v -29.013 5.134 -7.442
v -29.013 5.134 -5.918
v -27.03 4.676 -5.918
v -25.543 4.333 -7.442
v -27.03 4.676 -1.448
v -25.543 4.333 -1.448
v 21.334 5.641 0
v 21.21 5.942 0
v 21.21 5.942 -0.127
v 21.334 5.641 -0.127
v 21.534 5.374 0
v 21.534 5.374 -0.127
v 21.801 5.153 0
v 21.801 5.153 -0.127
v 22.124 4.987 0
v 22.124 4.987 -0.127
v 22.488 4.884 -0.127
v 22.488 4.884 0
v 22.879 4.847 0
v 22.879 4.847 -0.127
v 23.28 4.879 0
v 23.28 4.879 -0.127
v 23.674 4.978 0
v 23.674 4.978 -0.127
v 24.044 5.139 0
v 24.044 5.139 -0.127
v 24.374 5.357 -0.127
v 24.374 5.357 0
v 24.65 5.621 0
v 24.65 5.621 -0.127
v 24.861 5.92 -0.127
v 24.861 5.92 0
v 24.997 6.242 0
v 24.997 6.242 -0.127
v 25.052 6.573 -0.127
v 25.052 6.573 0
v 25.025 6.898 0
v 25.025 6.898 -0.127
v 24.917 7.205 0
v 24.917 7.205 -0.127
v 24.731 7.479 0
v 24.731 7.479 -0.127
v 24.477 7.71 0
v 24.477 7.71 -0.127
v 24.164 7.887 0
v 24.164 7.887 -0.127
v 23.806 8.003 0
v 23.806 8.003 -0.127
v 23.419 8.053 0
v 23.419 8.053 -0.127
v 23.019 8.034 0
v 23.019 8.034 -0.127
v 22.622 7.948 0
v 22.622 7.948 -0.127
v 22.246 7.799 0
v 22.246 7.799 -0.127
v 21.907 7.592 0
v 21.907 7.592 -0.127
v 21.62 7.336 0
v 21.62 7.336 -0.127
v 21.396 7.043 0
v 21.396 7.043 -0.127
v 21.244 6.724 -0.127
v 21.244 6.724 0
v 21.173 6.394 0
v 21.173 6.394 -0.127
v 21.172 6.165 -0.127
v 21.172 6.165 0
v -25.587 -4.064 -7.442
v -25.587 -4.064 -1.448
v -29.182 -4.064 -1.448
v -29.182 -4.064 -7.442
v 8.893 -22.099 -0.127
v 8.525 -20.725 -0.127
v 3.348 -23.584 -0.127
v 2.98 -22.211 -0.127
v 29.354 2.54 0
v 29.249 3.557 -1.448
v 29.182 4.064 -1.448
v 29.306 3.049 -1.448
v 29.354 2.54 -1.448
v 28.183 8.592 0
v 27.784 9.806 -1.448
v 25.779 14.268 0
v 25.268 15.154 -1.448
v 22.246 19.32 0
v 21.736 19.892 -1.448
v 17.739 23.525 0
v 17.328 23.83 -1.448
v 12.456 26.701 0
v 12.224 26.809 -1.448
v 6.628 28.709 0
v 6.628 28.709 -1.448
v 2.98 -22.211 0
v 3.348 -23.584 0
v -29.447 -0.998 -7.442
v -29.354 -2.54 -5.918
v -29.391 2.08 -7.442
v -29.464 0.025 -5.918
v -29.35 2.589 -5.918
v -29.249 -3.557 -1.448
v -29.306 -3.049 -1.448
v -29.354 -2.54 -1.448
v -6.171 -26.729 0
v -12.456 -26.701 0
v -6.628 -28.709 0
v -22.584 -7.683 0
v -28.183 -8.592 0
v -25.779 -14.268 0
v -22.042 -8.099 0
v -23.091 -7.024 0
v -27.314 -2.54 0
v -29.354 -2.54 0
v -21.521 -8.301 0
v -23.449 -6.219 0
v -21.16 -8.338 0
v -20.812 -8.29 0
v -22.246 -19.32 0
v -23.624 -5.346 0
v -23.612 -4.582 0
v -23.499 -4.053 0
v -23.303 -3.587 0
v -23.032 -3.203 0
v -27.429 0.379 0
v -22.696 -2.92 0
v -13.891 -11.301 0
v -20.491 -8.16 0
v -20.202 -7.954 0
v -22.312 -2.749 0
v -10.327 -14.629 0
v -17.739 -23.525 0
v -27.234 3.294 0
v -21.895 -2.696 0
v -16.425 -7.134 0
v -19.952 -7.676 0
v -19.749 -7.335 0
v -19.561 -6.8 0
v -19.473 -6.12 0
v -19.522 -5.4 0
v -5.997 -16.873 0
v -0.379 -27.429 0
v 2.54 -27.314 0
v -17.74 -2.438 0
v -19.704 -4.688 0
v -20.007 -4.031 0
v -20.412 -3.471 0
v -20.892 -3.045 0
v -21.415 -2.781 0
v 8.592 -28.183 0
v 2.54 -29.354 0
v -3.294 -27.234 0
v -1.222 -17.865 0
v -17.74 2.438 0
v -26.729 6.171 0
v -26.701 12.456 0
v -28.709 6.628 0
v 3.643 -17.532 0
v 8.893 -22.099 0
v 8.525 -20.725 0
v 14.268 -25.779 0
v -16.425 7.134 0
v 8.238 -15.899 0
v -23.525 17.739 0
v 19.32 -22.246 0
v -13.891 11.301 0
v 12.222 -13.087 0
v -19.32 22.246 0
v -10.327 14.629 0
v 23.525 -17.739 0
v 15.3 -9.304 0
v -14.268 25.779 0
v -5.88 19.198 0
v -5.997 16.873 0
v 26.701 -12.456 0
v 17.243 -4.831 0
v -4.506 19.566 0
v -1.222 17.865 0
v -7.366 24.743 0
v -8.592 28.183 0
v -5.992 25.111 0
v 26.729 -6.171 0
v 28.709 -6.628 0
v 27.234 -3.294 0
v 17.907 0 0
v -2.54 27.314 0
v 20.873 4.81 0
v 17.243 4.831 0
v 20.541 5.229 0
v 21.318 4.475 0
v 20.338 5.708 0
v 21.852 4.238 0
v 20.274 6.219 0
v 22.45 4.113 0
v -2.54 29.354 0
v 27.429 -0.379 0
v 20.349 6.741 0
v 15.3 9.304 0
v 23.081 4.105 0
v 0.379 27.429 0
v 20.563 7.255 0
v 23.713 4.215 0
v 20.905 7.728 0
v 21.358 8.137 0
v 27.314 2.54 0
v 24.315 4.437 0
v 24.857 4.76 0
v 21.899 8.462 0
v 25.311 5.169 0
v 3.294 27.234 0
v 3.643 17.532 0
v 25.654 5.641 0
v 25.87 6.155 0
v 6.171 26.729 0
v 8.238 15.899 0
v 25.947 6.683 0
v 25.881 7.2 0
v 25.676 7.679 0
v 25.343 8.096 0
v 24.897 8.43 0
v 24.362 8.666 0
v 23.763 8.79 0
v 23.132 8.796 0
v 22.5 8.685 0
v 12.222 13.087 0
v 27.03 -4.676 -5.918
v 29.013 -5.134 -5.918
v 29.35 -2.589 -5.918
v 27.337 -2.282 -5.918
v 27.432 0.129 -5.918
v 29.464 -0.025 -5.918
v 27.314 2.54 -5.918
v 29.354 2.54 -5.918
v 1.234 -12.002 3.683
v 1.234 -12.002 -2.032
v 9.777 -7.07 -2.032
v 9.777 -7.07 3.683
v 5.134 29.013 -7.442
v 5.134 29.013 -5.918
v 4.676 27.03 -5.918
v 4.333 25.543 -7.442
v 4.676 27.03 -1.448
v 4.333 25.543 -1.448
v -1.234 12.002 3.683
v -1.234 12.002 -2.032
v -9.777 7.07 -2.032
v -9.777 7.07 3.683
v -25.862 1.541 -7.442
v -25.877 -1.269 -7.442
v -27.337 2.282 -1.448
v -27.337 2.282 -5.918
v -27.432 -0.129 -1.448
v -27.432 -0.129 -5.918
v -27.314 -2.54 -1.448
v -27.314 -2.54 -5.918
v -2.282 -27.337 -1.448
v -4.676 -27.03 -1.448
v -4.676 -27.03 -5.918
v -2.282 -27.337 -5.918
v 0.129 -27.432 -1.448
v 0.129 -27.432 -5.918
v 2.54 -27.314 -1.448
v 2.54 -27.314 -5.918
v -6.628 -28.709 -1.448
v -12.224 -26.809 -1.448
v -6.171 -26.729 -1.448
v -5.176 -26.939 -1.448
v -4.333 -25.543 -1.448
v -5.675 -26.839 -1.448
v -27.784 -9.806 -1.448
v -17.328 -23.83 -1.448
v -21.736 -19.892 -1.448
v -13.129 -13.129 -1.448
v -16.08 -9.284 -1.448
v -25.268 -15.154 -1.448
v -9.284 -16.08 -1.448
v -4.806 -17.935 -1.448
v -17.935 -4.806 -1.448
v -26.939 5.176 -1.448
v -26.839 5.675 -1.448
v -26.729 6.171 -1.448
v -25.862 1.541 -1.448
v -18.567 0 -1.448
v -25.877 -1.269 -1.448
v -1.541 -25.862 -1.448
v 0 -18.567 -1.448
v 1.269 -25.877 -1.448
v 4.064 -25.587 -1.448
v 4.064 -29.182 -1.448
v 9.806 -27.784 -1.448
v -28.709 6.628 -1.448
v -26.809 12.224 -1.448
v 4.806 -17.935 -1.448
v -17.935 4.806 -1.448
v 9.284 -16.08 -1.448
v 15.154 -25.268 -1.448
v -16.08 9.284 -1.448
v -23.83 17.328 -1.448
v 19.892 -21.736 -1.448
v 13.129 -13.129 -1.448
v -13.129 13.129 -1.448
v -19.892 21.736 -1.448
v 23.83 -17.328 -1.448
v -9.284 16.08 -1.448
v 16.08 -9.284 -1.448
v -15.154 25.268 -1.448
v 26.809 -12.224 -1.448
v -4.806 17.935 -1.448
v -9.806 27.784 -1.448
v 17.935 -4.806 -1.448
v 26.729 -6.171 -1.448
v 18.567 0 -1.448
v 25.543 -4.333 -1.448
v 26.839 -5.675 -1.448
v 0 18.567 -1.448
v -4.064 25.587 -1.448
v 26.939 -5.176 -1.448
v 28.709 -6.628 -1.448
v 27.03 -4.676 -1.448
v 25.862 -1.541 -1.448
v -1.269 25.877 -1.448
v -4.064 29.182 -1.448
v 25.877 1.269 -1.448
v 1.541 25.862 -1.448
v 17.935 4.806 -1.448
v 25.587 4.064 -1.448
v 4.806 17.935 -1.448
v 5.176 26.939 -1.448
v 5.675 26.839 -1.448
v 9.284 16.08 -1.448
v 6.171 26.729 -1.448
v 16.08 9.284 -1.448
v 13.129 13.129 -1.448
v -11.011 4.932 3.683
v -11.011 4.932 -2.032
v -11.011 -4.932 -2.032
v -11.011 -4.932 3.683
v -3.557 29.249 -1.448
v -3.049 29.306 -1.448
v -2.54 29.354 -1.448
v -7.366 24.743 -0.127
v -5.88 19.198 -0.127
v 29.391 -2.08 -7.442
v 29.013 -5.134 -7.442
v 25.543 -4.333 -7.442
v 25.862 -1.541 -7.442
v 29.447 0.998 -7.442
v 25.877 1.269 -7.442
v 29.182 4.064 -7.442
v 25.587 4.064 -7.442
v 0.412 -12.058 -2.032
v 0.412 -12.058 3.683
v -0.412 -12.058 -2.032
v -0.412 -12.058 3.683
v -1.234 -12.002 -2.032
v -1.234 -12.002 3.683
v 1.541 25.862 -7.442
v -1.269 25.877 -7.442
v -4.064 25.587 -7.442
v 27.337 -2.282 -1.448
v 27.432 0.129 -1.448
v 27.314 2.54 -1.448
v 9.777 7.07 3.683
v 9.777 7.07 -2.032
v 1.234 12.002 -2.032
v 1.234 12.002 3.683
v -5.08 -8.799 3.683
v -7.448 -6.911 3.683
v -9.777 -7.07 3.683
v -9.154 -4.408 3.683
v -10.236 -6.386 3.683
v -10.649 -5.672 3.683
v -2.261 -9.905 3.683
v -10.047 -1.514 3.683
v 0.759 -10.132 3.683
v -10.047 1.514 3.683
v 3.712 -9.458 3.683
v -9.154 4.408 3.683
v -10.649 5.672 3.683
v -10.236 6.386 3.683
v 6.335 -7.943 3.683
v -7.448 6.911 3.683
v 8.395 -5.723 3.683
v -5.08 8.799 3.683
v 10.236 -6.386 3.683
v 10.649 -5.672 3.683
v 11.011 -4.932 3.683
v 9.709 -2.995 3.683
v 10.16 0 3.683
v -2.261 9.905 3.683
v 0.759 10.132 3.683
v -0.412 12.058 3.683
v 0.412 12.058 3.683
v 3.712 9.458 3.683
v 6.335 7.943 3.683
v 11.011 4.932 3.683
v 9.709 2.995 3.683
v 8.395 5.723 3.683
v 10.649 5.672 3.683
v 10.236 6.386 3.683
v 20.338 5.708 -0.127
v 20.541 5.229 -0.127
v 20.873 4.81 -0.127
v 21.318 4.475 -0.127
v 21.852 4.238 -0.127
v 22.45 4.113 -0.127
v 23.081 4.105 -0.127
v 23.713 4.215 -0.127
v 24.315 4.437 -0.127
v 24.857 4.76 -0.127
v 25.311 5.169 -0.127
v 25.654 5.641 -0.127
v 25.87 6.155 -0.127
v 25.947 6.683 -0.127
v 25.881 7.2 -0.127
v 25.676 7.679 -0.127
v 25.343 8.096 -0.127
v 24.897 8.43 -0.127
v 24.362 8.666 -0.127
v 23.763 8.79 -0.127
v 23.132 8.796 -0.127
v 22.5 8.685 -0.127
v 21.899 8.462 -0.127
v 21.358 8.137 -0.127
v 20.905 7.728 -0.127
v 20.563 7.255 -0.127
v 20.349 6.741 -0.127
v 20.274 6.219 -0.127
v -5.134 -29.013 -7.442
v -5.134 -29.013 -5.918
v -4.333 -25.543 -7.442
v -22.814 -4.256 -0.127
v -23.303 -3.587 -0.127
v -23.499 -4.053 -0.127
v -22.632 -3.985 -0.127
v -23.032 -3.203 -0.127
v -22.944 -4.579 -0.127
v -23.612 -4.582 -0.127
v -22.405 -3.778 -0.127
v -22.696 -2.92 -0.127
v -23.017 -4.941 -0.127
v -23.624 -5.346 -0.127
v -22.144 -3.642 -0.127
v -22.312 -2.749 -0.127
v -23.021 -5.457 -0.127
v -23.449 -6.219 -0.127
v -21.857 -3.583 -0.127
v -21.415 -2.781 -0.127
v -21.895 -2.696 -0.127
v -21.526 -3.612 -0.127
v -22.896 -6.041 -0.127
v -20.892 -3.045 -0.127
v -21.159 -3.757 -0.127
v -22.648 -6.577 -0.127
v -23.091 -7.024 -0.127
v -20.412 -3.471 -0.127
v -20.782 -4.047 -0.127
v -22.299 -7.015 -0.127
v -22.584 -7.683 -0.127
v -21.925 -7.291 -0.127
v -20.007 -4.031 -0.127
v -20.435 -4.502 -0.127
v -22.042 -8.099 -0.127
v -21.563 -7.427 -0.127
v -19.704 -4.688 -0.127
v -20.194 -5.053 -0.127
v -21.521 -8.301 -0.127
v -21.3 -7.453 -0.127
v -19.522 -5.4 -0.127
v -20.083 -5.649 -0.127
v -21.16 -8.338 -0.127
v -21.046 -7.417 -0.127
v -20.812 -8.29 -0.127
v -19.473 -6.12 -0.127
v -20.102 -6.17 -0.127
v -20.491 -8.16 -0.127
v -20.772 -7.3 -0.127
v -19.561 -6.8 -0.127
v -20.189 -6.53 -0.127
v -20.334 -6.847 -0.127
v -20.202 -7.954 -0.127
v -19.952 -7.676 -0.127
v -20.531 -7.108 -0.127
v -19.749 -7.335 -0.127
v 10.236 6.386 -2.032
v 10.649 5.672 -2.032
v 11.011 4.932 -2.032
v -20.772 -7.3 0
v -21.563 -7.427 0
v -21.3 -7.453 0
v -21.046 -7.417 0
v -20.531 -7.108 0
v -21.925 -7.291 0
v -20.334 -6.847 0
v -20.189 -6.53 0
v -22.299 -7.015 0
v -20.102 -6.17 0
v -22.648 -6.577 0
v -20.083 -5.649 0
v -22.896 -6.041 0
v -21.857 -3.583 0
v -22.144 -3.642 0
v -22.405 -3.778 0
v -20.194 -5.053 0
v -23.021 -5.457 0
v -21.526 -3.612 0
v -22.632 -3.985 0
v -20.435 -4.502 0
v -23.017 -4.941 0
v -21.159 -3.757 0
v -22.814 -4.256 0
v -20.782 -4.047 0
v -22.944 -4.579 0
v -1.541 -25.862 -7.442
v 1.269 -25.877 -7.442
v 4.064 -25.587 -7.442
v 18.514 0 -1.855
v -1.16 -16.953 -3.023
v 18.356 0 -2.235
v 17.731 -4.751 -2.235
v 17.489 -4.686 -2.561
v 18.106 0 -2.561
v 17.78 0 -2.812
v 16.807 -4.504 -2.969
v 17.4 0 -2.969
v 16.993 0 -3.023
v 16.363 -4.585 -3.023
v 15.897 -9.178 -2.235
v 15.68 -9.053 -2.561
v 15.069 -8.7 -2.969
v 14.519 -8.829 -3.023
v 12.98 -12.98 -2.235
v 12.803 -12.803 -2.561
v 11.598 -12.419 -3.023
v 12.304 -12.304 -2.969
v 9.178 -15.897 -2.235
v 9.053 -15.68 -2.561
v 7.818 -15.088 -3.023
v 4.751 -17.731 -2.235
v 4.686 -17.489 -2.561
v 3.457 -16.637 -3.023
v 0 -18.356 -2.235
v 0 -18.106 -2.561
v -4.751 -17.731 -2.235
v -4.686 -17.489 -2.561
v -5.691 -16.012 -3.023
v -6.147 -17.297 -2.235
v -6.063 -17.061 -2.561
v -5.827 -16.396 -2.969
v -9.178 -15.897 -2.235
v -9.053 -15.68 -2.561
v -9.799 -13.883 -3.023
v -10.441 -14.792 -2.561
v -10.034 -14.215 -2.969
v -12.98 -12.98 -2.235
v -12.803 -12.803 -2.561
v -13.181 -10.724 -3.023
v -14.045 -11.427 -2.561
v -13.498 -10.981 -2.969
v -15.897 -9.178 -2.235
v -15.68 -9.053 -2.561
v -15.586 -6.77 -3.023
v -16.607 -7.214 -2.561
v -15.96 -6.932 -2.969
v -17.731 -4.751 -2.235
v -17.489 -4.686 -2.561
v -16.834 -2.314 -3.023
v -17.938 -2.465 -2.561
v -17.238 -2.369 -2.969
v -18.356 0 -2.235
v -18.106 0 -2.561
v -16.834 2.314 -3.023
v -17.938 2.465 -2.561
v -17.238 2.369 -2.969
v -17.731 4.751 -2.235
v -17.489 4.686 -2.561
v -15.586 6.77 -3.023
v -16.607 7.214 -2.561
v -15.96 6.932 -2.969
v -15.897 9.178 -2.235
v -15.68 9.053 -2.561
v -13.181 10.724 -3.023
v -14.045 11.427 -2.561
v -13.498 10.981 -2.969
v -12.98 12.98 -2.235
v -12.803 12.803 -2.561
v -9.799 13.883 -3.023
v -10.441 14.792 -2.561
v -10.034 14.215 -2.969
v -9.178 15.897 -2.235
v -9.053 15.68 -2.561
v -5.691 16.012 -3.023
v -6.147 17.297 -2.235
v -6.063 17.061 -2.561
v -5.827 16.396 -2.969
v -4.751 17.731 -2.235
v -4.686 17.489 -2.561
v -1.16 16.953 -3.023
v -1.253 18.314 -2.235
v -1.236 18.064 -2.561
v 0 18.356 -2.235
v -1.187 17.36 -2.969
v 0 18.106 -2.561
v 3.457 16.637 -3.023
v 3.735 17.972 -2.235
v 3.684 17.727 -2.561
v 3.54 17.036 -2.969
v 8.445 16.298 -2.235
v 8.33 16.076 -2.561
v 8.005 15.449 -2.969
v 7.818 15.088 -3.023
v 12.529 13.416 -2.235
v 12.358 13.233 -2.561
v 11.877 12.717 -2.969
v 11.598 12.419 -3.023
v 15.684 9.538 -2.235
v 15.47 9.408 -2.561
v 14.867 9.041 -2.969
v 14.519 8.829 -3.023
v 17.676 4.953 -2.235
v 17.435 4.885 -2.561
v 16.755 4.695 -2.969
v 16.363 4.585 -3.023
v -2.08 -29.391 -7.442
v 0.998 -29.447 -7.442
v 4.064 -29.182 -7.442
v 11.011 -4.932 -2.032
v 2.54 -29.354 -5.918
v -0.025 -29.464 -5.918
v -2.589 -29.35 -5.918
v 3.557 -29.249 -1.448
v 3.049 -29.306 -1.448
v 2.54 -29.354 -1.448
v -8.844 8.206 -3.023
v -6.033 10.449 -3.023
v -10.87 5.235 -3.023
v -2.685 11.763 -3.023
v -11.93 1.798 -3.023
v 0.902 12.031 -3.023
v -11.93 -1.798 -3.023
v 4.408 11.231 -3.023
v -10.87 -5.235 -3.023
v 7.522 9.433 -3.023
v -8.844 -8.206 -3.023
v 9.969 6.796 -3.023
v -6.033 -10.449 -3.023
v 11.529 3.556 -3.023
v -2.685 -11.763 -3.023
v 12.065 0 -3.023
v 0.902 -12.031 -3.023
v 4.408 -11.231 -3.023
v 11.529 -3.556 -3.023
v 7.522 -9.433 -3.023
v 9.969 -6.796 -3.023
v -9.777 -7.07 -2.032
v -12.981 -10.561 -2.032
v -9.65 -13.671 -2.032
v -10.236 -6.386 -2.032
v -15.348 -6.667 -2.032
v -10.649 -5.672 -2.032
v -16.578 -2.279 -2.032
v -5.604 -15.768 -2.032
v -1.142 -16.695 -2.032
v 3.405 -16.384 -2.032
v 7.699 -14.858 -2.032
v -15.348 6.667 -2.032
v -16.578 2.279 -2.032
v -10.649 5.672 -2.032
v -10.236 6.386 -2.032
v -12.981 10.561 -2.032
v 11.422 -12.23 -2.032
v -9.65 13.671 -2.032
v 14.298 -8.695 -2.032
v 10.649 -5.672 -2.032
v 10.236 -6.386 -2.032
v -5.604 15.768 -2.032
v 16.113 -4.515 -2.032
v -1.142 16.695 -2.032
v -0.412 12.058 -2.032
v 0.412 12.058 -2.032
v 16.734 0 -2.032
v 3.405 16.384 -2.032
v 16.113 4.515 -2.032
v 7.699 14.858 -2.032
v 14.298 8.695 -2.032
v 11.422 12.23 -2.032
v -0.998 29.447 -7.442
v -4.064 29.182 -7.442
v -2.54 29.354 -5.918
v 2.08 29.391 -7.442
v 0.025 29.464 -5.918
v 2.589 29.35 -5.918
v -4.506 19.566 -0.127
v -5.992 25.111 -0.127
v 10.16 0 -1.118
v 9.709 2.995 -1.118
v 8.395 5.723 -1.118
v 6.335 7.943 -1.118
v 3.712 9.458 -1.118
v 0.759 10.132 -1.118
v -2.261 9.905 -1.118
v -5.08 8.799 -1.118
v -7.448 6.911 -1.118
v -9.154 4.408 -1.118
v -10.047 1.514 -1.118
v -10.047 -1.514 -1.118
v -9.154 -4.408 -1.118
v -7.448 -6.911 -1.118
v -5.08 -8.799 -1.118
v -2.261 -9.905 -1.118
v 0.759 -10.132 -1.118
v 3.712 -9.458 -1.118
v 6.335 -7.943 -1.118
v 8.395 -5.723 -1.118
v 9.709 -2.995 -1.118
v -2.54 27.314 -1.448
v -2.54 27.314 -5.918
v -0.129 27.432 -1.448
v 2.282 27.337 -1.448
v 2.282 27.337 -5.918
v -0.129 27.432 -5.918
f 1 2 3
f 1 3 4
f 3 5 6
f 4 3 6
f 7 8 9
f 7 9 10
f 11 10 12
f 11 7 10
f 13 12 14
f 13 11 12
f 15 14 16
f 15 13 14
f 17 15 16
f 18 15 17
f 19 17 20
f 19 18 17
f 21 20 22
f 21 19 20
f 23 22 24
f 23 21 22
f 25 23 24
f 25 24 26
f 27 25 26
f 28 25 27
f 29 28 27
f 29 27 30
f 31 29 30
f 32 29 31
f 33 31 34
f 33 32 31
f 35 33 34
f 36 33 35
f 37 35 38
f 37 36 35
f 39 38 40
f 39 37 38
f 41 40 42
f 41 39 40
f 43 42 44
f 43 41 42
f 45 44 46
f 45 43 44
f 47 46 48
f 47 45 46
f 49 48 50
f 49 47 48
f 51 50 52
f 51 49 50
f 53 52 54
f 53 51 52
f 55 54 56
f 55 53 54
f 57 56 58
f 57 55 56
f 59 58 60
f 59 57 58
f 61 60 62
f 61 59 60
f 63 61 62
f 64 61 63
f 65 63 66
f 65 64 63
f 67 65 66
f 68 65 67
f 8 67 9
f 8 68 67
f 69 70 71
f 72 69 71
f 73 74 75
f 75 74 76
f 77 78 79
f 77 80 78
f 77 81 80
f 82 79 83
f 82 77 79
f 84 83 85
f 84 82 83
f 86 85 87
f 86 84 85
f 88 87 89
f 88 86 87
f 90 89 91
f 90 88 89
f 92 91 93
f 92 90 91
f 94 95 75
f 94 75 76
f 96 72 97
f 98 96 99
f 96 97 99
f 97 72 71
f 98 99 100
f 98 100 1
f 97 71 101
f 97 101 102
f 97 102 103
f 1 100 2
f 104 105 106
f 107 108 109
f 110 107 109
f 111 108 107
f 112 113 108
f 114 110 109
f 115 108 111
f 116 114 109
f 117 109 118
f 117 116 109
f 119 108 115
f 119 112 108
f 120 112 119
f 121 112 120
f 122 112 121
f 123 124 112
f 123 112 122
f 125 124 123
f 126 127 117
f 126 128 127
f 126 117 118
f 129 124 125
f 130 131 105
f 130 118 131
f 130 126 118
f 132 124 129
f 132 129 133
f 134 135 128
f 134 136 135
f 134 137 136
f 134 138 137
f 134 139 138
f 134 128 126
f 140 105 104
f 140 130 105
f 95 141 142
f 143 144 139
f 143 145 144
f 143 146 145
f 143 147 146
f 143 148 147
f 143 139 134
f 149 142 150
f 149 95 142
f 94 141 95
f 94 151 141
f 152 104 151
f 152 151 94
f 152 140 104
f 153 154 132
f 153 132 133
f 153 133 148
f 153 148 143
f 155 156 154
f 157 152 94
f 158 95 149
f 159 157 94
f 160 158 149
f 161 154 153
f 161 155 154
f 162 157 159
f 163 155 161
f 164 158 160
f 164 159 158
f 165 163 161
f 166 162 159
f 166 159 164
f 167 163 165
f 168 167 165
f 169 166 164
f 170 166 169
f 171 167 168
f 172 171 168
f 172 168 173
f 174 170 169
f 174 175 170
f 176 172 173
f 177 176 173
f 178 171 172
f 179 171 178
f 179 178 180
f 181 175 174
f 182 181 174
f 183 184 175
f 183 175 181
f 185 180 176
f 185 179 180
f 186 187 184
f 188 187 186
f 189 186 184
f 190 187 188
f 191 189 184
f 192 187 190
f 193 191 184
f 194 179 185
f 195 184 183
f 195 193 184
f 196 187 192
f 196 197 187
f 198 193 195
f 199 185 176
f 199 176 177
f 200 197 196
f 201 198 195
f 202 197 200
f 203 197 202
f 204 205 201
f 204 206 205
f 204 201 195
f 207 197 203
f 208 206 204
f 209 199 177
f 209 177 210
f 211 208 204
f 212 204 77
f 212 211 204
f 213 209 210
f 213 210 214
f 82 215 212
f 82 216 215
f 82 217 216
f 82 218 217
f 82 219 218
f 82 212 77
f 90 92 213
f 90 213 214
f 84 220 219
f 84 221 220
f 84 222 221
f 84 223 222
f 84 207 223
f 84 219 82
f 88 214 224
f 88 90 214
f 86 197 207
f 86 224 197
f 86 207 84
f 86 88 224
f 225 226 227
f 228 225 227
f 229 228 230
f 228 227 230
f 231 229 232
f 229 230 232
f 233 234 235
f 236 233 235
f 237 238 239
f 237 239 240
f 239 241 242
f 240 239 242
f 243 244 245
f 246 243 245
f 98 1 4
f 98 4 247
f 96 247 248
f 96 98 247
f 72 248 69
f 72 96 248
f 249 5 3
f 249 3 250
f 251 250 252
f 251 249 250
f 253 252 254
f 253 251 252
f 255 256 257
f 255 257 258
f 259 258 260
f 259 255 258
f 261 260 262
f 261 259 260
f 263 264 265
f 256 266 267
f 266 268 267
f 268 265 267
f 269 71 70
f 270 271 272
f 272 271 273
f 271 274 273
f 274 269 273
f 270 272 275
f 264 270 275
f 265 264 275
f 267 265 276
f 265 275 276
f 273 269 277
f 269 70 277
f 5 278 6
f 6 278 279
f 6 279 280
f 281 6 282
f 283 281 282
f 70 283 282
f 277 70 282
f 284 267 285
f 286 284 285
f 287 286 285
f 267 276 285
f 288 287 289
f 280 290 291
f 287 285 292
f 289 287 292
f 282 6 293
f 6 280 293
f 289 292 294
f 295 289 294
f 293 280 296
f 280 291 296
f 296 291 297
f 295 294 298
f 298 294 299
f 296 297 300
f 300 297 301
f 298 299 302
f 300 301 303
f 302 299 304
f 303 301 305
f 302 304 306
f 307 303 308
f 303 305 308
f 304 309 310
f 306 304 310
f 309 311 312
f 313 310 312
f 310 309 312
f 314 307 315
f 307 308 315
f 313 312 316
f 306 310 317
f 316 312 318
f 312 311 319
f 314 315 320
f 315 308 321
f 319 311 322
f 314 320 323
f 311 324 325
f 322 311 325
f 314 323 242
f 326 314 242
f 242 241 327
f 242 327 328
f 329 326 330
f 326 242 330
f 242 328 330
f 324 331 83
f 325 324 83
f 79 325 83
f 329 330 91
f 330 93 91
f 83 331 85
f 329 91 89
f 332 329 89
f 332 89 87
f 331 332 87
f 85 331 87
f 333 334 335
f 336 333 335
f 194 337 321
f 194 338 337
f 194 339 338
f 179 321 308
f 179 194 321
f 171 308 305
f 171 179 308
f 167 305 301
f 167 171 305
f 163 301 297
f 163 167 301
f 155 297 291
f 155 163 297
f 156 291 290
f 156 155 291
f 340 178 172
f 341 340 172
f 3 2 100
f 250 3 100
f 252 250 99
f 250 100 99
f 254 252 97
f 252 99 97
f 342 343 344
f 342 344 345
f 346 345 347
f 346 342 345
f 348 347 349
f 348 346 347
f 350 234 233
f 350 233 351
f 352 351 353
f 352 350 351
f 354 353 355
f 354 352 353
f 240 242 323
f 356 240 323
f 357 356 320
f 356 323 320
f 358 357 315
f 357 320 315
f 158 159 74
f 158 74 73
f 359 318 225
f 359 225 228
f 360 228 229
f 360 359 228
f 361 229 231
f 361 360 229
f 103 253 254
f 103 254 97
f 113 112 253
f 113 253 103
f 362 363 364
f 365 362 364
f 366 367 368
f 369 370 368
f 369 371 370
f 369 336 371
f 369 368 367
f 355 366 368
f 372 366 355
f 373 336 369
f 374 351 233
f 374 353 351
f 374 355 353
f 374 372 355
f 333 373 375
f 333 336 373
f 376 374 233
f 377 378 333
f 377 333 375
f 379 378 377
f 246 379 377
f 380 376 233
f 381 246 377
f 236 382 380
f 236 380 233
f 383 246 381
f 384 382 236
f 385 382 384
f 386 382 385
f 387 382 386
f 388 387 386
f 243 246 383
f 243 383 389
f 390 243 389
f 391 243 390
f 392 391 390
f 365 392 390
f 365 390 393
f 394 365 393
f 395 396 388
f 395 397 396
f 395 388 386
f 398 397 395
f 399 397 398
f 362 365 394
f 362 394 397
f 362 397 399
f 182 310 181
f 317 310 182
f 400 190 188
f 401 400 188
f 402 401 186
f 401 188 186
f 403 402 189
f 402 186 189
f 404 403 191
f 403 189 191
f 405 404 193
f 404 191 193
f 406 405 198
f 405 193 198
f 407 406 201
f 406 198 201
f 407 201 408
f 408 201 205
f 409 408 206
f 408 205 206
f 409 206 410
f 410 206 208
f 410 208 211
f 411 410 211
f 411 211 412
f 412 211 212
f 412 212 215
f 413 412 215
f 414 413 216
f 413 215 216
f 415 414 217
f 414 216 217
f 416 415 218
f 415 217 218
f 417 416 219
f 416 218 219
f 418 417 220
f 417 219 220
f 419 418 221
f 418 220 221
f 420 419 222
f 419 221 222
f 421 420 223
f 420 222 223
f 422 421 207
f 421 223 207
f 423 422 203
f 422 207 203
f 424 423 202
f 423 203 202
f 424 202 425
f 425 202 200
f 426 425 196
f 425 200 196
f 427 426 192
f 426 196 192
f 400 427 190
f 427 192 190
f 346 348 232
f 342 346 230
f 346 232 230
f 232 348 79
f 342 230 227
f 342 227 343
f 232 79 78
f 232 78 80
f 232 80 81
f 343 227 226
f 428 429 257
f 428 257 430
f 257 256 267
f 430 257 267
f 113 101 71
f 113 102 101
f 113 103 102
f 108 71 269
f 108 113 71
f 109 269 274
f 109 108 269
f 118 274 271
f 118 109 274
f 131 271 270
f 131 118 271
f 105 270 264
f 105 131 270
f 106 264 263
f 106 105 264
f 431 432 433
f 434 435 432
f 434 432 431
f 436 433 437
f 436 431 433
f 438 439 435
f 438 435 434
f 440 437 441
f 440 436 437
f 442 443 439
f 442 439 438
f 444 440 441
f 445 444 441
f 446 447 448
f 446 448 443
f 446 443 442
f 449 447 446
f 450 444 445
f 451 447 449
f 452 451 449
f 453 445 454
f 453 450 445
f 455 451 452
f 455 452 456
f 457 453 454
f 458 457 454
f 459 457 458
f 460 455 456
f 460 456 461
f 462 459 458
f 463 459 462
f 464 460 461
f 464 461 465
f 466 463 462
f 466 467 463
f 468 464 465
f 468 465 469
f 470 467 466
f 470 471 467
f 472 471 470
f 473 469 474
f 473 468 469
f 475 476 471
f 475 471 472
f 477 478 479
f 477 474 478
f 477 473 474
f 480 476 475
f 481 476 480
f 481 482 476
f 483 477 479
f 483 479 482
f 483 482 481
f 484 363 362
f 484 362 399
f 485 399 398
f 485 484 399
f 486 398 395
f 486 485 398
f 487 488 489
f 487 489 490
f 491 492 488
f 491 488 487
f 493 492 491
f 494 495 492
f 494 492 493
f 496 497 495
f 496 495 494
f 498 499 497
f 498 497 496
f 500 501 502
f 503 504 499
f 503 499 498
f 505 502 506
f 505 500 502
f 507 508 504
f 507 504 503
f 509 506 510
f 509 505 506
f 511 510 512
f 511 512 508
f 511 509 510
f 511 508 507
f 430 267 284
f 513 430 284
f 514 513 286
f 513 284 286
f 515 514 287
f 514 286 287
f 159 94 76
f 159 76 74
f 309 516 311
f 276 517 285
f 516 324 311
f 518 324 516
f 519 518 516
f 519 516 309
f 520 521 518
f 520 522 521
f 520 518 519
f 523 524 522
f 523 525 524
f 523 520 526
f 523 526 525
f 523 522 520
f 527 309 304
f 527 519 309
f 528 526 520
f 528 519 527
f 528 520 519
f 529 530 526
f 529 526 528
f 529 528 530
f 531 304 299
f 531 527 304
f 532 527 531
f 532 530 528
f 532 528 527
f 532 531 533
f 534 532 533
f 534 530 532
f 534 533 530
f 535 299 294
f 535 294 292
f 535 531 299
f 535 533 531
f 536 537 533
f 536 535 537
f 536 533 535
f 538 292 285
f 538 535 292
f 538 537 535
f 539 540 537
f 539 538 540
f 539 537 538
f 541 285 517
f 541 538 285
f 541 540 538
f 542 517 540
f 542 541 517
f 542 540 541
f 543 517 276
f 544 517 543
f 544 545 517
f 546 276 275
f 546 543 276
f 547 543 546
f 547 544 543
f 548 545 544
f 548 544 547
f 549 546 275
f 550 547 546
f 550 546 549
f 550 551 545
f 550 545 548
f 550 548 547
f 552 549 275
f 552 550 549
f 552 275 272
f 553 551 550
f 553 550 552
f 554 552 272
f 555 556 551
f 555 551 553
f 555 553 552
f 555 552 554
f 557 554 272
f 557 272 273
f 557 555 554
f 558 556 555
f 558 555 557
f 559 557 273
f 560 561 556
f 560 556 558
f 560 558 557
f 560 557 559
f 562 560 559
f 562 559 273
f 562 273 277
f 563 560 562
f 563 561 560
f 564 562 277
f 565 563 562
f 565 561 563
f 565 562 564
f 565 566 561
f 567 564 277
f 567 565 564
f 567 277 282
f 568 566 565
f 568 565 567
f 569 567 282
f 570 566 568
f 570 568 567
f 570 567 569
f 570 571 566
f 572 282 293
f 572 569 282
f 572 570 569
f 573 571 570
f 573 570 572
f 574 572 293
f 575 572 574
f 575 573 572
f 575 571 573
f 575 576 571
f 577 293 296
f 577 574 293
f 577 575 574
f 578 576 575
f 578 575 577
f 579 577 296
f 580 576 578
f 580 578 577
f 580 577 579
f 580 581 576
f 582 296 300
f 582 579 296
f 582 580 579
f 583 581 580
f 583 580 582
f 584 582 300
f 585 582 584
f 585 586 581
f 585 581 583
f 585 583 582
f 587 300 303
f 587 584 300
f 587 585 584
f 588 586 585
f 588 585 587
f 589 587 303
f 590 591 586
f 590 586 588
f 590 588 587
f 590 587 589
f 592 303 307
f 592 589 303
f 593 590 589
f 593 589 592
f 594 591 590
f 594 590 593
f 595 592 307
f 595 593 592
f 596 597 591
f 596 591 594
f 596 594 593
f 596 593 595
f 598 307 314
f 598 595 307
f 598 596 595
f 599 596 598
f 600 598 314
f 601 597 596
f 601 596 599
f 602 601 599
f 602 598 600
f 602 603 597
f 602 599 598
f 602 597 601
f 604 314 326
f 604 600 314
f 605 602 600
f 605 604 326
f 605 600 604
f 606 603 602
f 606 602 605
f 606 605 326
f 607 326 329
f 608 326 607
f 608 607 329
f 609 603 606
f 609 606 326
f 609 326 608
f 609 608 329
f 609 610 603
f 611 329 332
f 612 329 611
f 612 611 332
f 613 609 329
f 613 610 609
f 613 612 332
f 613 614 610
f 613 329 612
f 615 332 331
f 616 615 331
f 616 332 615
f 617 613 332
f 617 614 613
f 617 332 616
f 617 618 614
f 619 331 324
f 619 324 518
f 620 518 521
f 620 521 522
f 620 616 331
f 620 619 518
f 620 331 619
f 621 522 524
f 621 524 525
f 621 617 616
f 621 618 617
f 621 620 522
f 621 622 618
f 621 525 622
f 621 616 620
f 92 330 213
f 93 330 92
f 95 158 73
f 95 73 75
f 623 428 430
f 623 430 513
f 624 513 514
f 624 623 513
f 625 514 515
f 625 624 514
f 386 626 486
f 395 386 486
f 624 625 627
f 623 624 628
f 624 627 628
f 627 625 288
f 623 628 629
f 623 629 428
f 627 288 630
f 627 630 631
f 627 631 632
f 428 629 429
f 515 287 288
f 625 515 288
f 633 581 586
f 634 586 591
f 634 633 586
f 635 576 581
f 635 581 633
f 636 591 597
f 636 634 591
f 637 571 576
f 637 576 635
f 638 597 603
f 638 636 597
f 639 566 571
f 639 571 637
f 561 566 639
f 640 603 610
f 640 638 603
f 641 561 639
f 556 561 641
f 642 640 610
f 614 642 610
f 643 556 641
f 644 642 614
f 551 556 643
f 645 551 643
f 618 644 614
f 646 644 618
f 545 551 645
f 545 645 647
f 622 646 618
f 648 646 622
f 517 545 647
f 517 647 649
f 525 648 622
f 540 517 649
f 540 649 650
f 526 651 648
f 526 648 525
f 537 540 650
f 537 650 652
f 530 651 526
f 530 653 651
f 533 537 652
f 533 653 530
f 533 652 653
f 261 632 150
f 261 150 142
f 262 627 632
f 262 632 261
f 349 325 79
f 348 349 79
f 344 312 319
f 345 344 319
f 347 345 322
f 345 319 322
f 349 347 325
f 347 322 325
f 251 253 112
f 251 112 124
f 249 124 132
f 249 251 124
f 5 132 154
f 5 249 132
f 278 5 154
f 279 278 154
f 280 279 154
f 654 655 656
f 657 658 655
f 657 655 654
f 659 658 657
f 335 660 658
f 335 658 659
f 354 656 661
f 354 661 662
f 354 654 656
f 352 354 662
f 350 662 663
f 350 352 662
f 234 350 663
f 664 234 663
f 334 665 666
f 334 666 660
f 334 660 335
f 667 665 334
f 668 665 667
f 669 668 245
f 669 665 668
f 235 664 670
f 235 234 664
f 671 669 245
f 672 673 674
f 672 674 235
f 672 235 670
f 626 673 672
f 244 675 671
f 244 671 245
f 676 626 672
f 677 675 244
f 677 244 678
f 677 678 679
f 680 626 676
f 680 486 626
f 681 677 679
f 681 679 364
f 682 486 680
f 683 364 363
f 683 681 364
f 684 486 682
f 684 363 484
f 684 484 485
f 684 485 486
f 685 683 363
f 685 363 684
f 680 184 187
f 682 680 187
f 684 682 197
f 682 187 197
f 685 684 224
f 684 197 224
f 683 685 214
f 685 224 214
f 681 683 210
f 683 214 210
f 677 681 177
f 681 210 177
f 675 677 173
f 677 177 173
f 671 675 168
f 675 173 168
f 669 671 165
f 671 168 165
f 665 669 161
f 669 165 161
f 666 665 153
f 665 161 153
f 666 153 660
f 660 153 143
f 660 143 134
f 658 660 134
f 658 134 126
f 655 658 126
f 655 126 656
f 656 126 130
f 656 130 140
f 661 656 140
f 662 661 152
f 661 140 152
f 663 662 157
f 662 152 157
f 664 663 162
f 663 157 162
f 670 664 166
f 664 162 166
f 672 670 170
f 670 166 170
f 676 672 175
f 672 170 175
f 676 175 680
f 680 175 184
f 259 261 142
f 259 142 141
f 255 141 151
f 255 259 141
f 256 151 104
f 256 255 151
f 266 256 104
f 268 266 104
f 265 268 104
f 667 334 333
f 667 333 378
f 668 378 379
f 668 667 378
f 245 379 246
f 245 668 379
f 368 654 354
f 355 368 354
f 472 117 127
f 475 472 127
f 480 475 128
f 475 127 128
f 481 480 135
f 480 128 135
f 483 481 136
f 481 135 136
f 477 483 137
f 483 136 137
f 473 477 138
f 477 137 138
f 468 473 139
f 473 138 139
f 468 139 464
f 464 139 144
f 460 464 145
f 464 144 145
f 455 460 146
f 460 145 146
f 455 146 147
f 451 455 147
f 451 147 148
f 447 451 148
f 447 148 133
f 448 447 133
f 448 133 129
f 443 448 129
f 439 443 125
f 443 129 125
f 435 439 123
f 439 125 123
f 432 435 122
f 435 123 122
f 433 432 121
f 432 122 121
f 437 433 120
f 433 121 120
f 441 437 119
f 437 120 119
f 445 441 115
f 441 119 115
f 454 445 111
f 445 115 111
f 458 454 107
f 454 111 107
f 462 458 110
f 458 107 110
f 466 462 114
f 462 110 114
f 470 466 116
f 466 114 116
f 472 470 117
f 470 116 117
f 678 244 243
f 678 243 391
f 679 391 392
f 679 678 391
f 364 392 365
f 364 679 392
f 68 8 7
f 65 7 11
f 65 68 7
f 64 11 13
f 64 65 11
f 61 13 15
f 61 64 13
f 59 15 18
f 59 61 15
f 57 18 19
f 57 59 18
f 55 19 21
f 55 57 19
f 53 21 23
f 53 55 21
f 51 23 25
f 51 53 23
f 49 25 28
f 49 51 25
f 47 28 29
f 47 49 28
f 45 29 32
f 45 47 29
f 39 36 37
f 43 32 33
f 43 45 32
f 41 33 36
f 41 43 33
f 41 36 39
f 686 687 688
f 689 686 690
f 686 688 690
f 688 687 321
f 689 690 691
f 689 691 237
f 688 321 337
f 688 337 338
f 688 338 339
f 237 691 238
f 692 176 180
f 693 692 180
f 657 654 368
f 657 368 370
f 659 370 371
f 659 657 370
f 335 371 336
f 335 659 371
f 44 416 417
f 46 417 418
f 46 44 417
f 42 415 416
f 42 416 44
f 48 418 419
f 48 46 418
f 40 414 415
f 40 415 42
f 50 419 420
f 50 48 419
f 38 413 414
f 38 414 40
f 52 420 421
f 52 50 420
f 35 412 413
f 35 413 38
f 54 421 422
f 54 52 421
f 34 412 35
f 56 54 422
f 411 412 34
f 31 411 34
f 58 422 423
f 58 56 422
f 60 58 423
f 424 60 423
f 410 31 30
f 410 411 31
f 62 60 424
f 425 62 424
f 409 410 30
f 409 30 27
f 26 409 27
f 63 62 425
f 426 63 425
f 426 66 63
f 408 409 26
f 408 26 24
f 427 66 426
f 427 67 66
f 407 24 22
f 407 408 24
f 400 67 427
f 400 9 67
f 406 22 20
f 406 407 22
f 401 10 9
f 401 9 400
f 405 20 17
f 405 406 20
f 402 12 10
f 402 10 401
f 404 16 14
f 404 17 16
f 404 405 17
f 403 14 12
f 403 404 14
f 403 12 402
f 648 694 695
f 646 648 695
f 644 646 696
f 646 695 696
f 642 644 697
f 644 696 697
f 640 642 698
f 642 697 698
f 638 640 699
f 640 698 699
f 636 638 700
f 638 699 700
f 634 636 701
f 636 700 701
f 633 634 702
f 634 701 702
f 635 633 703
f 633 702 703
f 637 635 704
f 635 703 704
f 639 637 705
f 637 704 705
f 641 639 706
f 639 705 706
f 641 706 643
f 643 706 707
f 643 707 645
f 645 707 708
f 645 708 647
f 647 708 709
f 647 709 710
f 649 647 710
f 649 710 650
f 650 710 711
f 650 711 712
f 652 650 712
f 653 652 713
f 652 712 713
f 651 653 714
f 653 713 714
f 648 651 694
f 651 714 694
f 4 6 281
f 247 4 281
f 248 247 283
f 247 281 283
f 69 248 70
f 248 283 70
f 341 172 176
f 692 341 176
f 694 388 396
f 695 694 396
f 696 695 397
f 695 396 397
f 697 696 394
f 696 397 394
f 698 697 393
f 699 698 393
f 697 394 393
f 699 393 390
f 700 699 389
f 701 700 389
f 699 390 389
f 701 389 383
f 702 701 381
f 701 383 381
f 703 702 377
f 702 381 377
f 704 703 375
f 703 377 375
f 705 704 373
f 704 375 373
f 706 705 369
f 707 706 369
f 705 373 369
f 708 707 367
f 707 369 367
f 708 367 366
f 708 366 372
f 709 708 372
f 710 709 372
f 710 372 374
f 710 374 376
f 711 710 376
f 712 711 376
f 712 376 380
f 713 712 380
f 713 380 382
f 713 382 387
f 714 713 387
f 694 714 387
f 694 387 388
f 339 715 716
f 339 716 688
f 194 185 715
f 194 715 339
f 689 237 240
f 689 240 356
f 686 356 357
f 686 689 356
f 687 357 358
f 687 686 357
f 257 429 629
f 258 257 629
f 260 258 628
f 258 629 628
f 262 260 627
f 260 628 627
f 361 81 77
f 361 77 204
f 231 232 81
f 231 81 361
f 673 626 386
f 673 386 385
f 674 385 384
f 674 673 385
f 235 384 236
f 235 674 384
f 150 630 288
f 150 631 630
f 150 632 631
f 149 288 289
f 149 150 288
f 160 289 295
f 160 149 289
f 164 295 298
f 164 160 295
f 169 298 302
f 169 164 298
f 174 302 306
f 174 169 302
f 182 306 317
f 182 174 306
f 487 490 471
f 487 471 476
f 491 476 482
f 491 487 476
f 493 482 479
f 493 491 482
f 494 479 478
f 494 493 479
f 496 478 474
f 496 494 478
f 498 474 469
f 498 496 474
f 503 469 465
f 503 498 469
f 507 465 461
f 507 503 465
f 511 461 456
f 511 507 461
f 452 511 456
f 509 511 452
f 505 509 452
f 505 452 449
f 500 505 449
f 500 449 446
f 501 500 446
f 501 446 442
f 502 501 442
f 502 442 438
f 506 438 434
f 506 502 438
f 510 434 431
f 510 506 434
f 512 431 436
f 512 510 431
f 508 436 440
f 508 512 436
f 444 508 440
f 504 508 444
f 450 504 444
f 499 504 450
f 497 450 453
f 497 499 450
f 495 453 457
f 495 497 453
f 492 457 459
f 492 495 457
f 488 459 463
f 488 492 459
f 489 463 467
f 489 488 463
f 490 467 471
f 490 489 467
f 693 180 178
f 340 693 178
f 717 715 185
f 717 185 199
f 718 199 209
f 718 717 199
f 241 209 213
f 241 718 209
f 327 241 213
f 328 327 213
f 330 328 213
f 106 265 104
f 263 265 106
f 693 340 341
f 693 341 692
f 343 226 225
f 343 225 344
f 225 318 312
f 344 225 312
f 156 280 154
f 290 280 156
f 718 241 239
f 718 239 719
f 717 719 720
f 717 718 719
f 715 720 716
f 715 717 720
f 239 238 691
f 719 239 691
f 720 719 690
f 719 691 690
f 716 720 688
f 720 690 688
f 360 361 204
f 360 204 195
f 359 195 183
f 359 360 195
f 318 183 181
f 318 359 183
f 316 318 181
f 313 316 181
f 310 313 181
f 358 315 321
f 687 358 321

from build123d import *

# Parameters (mm, degrees)
SKETCH1_R           = 29.464
BASE_EXTRUDE_DEPTH  = 1.4478
SKETCH2_R           = 18.5674
BOSS_EXTRUDE1_DEPTH = 1.5748
FILLET1_R           = 1.5748
SKETCH3_R           = 17.907
CUT_EXTRUDE1_DEPTH  = 2.032
CUT_EXTRUDE1_DRAFT  = -30
BOSS_EXTRUDE2_DEPTH = 5.715
CUT_EXTRUDE2_START  = -5.715
CUT_EXTRUDE2_DEPTH  = 5.715
SKETCH6_R           = 10.16
CUT_EXTRUDE3_DEPTH  = 43.204498141
CUT_EXTRUDE4_DEPTH  = 42.983088269
CIRPATTERN1_COUNT   = 4
BOSS_EXTRUDE3_DEPTH = 5.9944
CUT_EXTRUDE5_DEPTH  = 4.4704
CIRPATTERN2_COUNT   = 4
CUT_EXTRUDE6_DEPTH  = 0.127
CUT_EXTRUDE7_DEPTH  = 0.127
SKETCH13_RX         = 2.8702
SKETCH13_RY         = 2.315943611
SKETCH13_RX_2       = 1.966975065
SKETCH13_RY_2       = 1.574218937
SKETCH13_RY_3       = 2.01509994
SKETCH13_RX_3       = 1.966974984
SKETCH13_RY_4       = 1.436201162
CUT_EXTRUDE8_DEPTH  = 0.127
CHAMFER1_SIZE       = 1.905


# Read off the part's stored shape, not the designer's step: Cut-Extrude2
with BuildPart() as part:
    # Sketch1 → Base-Extrude (new body)
    with BuildSketch(Plane.XY):
        Circle(SKETCH1_R)
    extrude(amount=-BASE_EXTRUDE_DEPTH)

    # Sketch2 → Boss-Extrude1 (add)
    with BuildSketch(Plane(origin=(0, 0, -1.4478), x_dir=(-1, 0, 0), z_dir=(0, 0, -1))):
        with Locations(Location((0, 0, 0), (0, 0, 180))):
            Circle(SKETCH2_R)
    extrude(amount=BOSS_EXTRUDE1_DEPTH)

    # Fillet1
    fillet1_edges = [part.edges().sort_by_distance(p)[0] for p in [
        (-18.5674, 0, -3.0226),
    ]]
    fillet(fillet1_edges, radius=FILLET1_R - 0.0001)  # a hair under: the kernel refuses the full size


with BuildPart() as cut_extrude1_tool:
    # Sketch3 → Cut-Extrude1 (with draft: the straight prism first)
    with BuildSketch(Plane.XY):
        Circle(SKETCH3_R)
    extrude(amount=-CUT_EXTRUDE1_DEPTH)
    # Cut-Extrude1: the draft: its side faces are tilted about the plane it starts from
    cut_extrude1_sides = [cut_extrude1_tool.faces().sort_by_distance(p)[0] for p in [
        (-17.907, 0, -1.016),
    ]]
    draft(cut_extrude1_sides, Plane.XY, CUT_EXTRUDE1_DRAFT)


with BuildPart() as part_1:
    add(part.part)

    # Cut-Extrude1: cut by cut_extrude1_tool
    add(cut_extrude1_tool.part, mode=Mode.SUBTRACT)

    # Sketch4 → Boss-Extrude2 (add)
    with BuildSketch(Plane.XY.offset(-2.032)):
        Polygon((0, 12.714292158), (-11.0109, 6.357146079), (-11.0109, -6.357146079), (0, -12.714292158), (11.0109, -6.357146079), (11.0109, 6.357146079), align=None)
    extrude(amount=BOSS_EXTRUDE2_DEPTH)

    # Cut-Extrude2 outline → Cut-Extrude2 (cut)
    with BuildSketch(Plane.XY.offset(3.683).offset(CUT_EXTRUDE2_START)):
        with BuildLine():
            ThreePointArc((-11.0109, 4.931967781), (-10.448596497, 6.0325), (-9.776659389, 7.069735228))
            Line((-9.776659389, 7.069735228), (-11.0109, 6.357146079))
            Line((-11.0109, 6.357146079), (-11.0109, 4.931967781))
        make_face()
        with BuildLine():
            Line((0, 12.714292158), (-1.234240611, 12.001703009))
            ThreePointArc((-1.234240611, 12.001703009), (0, 12.065), (1.234240611, 12.001703009))
            Line((1.234240611, 12.001703009), (0, 12.714292158))
        make_face()
        with BuildLine():
            ThreePointArc((-9.776659389, -7.069735228), (-10.448596497, -6.0325), (-11.0109, -4.931967781))
            Line((-11.0109, -4.931967781), (-11.0109, -6.357146079))
            Line((-11.0109, -6.357146079), (-9.776659389, -7.069735228))
        make_face()
        with BuildLine():
            Line((11.0109, 6.357146079), (9.776659389, 7.069735228))
            ThreePointArc((9.776659389, 7.069735228), (10.448596497, 6.0325), (11.0109, 4.931967781))
            Line((11.0109, 4.931967781), (11.0109, 6.357146079))
        make_face()
        with BuildLine():
            ThreePointArc((1.234240611, -12.001703009), (0, -12.065), (-1.234240611, -12.001703009))
            Line((-1.234240611, -12.001703009), (0, -12.714292158))
            Line((0, -12.714292158), (1.234240611, -12.001703009))
        make_face()
        with BuildLine():
            Line((11.0109, -6.357146079), (11.0109, -4.931967781))
            ThreePointArc((11.0109, -4.931967781), (10.448596497, -6.0325), (9.776659389, -7.069735228))
            Line((9.776659389, -7.069735228), (11.0109, -6.357146079))
        make_face()
    extrude(amount=CUT_EXTRUDE2_DEPTH, mode=Mode.SUBTRACT)

    # Sketch6 → Cut-Extrude3 (cut, through all)
    with BuildSketch(Plane.XY.offset(3.683)):
        Circle(SKETCH6_R)
    extrude(amount=-CUT_EXTRUDE3_DEPTH, mode=Mode.SUBTRACT)

    # Sketch8 → Cut-Extrude4 (cut, through all)
    with BuildSketch(Plane(origin=(0, 0, -1.4478), x_dir=(-1, 0, 0), z_dir=(0, 0, -1))):
        with BuildLine():
            Line((2.54, 29.354313073), (2.54, 27.314154279))
            ThreePointArc((2.54, 27.314154279), (-1.838860007, 27.370298096), (-6.170857323, 26.728919617))
            Line((-6.170857323, 26.728919617), (-6.627957865, 28.708839589))
            ThreePointArc((-6.627957865, 28.708839589), (-2.069301544, 29.391245076), (2.54, 29.354313073))
        make_face()
    cut_extrude4 = extrude(amount=-CUT_EXTRUDE4_DEPTH, mode=Mode.SUBTRACT)

    # CirPattern1: Cut-Extrude4 ×4 about axis
    cirpattern1_axis = Axis((0, 0, 0), (0, 0, 1))
    for i in range(1, CIRPATTERN1_COUNT):
        add(cut_extrude4.rotate(cirpattern1_axis, i * 360 / CIRPATTERN1_COUNT), mode=Mode.SUBTRACT)

    # Sketch9 → Boss-Extrude3 (add)
    with BuildSketch(Plane(origin=(0, 0, -1.4478), x_dir=(-1, 0, 0), z_dir=(0, 0, -1))):
        with BuildLine():
            Line((4.064, 25.587269647), (4.064, 29.182378244))
            ThreePointArc((4.064, 29.182378244), (-0.541715145, 29.459019683), (-5.134145774, 29.013235655))
            Line((-5.134145774, 29.013235655), (-4.333000099, 25.543092494))
            ThreePointArc((-4.333000099, 25.543092494), (-0.136301756, 25.907641456), (4.064, 25.587269647))
        make_face()
    boss_extrude3 = extrude(amount=BOSS_EXTRUDE3_DEPTH)

    # Sketch10 → Cut-Extrude5 (cut)
    with BuildSketch(Plane.XY.offset(-1.4478)):
        with BuildLine():
            Line((5.134145774, 29.013235655), (4.676387057, 27.030464815))
            ThreePointArc((4.676387057, 27.030464815), (1.07757011, 27.410827544), (-2.54, 27.314154279))
            Line((-2.54, 27.314154279), (-2.54, 29.354313073))
            ThreePointArc((-2.54, 29.354313073), (1.308236036, 29.434942067), (5.134145774, 29.013235655))
        make_face()
    cut_extrude5 = extrude(amount=-CUT_EXTRUDE5_DEPTH, mode=Mode.SUBTRACT)

    # CirPattern2: Boss-Extrude3, Cut-Extrude5 ×4 about axis
    cirpattern2_axis = Axis((0, 0, 0), (0, 0, 1))
    add([boss_extrude3.rotate(cirpattern2_axis, i * 360 / CIRPATTERN2_COUNT) for i in range(1, CIRPATTERN2_COUNT)])
    add([cut_extrude5.rotate(cirpattern2_axis, i * 360 / CIRPATTERN2_COUNT) for i in range(1, CIRPATTERN2_COUNT)], mode=Mode.SUBTRACT)

    # Sketch11 → Cut-Extrude6 (cut)
    with BuildSketch(Plane.XY):
        Polygon((-7.366154253, 24.742996139), (-5.880429407, 19.198195525), (-4.506496511, 19.566339735), (-5.992221358, 25.111140348), align=None)
    extrude(amount=-CUT_EXTRUDE6_DEPTH, mode=Mode.SUBTRACT)

    # Sketch12 → Cut-Extrude7 (cut)
    with BuildSketch(Plane.XY):
        Polygon((2.979852971, -22.210563913), (8.524653584, -20.724839066), (8.892797794, -22.098771961), (3.347997181, -23.584496808), align=None)
    extrude(amount=-CUT_EXTRUDE7_DEPTH, mode=Mode.SUBTRACT)

    # Sketch13 → Cut-Extrude8 (cut)
    # profile 1 of 2: a face of its own
    with BuildSketch(Plane.XY):
        with Locations(Location((23.11032284, 6.450896771), (0, 0, -165))):
            Ellipse(SKETCH13_RX, SKETCH13_RY)
        with Locations(Location((23.11032284, 6.450896771), (0, 0, -165))):
            Ellipse(SKETCH13_RX_2, SKETCH13_RY_2, mode=Mode.SUBTRACT)
    # profile 2 of 2: a face of its own
    with BuildSketch(Plane.XY):
        with Locations(Location((-21.554852577, -5.517100911), (0, 0, -75))):
            Ellipse(SKETCH13_RX, SKETCH13_RY_3)
        with Locations(Location((-21.554852577, -5.517100911), (0, 0, -75))):
            Ellipse(SKETCH13_RX_3, SKETCH13_RY_4, mode=Mode.SUBTRACT)
    extrude(amount=-CUT_EXTRUDE8_DEPTH, mode=Mode.SUBTRACT)

    # Chamfer1
    chamfer1_edges = [part_1.edges().sort_by_distance(p)[0] for p in [
        (-10.16, 0, -3.0226),
    ]]
    chamfer(chamfer1_edges, length=CHAMFER1_SIZE)


solid = part_1.part
